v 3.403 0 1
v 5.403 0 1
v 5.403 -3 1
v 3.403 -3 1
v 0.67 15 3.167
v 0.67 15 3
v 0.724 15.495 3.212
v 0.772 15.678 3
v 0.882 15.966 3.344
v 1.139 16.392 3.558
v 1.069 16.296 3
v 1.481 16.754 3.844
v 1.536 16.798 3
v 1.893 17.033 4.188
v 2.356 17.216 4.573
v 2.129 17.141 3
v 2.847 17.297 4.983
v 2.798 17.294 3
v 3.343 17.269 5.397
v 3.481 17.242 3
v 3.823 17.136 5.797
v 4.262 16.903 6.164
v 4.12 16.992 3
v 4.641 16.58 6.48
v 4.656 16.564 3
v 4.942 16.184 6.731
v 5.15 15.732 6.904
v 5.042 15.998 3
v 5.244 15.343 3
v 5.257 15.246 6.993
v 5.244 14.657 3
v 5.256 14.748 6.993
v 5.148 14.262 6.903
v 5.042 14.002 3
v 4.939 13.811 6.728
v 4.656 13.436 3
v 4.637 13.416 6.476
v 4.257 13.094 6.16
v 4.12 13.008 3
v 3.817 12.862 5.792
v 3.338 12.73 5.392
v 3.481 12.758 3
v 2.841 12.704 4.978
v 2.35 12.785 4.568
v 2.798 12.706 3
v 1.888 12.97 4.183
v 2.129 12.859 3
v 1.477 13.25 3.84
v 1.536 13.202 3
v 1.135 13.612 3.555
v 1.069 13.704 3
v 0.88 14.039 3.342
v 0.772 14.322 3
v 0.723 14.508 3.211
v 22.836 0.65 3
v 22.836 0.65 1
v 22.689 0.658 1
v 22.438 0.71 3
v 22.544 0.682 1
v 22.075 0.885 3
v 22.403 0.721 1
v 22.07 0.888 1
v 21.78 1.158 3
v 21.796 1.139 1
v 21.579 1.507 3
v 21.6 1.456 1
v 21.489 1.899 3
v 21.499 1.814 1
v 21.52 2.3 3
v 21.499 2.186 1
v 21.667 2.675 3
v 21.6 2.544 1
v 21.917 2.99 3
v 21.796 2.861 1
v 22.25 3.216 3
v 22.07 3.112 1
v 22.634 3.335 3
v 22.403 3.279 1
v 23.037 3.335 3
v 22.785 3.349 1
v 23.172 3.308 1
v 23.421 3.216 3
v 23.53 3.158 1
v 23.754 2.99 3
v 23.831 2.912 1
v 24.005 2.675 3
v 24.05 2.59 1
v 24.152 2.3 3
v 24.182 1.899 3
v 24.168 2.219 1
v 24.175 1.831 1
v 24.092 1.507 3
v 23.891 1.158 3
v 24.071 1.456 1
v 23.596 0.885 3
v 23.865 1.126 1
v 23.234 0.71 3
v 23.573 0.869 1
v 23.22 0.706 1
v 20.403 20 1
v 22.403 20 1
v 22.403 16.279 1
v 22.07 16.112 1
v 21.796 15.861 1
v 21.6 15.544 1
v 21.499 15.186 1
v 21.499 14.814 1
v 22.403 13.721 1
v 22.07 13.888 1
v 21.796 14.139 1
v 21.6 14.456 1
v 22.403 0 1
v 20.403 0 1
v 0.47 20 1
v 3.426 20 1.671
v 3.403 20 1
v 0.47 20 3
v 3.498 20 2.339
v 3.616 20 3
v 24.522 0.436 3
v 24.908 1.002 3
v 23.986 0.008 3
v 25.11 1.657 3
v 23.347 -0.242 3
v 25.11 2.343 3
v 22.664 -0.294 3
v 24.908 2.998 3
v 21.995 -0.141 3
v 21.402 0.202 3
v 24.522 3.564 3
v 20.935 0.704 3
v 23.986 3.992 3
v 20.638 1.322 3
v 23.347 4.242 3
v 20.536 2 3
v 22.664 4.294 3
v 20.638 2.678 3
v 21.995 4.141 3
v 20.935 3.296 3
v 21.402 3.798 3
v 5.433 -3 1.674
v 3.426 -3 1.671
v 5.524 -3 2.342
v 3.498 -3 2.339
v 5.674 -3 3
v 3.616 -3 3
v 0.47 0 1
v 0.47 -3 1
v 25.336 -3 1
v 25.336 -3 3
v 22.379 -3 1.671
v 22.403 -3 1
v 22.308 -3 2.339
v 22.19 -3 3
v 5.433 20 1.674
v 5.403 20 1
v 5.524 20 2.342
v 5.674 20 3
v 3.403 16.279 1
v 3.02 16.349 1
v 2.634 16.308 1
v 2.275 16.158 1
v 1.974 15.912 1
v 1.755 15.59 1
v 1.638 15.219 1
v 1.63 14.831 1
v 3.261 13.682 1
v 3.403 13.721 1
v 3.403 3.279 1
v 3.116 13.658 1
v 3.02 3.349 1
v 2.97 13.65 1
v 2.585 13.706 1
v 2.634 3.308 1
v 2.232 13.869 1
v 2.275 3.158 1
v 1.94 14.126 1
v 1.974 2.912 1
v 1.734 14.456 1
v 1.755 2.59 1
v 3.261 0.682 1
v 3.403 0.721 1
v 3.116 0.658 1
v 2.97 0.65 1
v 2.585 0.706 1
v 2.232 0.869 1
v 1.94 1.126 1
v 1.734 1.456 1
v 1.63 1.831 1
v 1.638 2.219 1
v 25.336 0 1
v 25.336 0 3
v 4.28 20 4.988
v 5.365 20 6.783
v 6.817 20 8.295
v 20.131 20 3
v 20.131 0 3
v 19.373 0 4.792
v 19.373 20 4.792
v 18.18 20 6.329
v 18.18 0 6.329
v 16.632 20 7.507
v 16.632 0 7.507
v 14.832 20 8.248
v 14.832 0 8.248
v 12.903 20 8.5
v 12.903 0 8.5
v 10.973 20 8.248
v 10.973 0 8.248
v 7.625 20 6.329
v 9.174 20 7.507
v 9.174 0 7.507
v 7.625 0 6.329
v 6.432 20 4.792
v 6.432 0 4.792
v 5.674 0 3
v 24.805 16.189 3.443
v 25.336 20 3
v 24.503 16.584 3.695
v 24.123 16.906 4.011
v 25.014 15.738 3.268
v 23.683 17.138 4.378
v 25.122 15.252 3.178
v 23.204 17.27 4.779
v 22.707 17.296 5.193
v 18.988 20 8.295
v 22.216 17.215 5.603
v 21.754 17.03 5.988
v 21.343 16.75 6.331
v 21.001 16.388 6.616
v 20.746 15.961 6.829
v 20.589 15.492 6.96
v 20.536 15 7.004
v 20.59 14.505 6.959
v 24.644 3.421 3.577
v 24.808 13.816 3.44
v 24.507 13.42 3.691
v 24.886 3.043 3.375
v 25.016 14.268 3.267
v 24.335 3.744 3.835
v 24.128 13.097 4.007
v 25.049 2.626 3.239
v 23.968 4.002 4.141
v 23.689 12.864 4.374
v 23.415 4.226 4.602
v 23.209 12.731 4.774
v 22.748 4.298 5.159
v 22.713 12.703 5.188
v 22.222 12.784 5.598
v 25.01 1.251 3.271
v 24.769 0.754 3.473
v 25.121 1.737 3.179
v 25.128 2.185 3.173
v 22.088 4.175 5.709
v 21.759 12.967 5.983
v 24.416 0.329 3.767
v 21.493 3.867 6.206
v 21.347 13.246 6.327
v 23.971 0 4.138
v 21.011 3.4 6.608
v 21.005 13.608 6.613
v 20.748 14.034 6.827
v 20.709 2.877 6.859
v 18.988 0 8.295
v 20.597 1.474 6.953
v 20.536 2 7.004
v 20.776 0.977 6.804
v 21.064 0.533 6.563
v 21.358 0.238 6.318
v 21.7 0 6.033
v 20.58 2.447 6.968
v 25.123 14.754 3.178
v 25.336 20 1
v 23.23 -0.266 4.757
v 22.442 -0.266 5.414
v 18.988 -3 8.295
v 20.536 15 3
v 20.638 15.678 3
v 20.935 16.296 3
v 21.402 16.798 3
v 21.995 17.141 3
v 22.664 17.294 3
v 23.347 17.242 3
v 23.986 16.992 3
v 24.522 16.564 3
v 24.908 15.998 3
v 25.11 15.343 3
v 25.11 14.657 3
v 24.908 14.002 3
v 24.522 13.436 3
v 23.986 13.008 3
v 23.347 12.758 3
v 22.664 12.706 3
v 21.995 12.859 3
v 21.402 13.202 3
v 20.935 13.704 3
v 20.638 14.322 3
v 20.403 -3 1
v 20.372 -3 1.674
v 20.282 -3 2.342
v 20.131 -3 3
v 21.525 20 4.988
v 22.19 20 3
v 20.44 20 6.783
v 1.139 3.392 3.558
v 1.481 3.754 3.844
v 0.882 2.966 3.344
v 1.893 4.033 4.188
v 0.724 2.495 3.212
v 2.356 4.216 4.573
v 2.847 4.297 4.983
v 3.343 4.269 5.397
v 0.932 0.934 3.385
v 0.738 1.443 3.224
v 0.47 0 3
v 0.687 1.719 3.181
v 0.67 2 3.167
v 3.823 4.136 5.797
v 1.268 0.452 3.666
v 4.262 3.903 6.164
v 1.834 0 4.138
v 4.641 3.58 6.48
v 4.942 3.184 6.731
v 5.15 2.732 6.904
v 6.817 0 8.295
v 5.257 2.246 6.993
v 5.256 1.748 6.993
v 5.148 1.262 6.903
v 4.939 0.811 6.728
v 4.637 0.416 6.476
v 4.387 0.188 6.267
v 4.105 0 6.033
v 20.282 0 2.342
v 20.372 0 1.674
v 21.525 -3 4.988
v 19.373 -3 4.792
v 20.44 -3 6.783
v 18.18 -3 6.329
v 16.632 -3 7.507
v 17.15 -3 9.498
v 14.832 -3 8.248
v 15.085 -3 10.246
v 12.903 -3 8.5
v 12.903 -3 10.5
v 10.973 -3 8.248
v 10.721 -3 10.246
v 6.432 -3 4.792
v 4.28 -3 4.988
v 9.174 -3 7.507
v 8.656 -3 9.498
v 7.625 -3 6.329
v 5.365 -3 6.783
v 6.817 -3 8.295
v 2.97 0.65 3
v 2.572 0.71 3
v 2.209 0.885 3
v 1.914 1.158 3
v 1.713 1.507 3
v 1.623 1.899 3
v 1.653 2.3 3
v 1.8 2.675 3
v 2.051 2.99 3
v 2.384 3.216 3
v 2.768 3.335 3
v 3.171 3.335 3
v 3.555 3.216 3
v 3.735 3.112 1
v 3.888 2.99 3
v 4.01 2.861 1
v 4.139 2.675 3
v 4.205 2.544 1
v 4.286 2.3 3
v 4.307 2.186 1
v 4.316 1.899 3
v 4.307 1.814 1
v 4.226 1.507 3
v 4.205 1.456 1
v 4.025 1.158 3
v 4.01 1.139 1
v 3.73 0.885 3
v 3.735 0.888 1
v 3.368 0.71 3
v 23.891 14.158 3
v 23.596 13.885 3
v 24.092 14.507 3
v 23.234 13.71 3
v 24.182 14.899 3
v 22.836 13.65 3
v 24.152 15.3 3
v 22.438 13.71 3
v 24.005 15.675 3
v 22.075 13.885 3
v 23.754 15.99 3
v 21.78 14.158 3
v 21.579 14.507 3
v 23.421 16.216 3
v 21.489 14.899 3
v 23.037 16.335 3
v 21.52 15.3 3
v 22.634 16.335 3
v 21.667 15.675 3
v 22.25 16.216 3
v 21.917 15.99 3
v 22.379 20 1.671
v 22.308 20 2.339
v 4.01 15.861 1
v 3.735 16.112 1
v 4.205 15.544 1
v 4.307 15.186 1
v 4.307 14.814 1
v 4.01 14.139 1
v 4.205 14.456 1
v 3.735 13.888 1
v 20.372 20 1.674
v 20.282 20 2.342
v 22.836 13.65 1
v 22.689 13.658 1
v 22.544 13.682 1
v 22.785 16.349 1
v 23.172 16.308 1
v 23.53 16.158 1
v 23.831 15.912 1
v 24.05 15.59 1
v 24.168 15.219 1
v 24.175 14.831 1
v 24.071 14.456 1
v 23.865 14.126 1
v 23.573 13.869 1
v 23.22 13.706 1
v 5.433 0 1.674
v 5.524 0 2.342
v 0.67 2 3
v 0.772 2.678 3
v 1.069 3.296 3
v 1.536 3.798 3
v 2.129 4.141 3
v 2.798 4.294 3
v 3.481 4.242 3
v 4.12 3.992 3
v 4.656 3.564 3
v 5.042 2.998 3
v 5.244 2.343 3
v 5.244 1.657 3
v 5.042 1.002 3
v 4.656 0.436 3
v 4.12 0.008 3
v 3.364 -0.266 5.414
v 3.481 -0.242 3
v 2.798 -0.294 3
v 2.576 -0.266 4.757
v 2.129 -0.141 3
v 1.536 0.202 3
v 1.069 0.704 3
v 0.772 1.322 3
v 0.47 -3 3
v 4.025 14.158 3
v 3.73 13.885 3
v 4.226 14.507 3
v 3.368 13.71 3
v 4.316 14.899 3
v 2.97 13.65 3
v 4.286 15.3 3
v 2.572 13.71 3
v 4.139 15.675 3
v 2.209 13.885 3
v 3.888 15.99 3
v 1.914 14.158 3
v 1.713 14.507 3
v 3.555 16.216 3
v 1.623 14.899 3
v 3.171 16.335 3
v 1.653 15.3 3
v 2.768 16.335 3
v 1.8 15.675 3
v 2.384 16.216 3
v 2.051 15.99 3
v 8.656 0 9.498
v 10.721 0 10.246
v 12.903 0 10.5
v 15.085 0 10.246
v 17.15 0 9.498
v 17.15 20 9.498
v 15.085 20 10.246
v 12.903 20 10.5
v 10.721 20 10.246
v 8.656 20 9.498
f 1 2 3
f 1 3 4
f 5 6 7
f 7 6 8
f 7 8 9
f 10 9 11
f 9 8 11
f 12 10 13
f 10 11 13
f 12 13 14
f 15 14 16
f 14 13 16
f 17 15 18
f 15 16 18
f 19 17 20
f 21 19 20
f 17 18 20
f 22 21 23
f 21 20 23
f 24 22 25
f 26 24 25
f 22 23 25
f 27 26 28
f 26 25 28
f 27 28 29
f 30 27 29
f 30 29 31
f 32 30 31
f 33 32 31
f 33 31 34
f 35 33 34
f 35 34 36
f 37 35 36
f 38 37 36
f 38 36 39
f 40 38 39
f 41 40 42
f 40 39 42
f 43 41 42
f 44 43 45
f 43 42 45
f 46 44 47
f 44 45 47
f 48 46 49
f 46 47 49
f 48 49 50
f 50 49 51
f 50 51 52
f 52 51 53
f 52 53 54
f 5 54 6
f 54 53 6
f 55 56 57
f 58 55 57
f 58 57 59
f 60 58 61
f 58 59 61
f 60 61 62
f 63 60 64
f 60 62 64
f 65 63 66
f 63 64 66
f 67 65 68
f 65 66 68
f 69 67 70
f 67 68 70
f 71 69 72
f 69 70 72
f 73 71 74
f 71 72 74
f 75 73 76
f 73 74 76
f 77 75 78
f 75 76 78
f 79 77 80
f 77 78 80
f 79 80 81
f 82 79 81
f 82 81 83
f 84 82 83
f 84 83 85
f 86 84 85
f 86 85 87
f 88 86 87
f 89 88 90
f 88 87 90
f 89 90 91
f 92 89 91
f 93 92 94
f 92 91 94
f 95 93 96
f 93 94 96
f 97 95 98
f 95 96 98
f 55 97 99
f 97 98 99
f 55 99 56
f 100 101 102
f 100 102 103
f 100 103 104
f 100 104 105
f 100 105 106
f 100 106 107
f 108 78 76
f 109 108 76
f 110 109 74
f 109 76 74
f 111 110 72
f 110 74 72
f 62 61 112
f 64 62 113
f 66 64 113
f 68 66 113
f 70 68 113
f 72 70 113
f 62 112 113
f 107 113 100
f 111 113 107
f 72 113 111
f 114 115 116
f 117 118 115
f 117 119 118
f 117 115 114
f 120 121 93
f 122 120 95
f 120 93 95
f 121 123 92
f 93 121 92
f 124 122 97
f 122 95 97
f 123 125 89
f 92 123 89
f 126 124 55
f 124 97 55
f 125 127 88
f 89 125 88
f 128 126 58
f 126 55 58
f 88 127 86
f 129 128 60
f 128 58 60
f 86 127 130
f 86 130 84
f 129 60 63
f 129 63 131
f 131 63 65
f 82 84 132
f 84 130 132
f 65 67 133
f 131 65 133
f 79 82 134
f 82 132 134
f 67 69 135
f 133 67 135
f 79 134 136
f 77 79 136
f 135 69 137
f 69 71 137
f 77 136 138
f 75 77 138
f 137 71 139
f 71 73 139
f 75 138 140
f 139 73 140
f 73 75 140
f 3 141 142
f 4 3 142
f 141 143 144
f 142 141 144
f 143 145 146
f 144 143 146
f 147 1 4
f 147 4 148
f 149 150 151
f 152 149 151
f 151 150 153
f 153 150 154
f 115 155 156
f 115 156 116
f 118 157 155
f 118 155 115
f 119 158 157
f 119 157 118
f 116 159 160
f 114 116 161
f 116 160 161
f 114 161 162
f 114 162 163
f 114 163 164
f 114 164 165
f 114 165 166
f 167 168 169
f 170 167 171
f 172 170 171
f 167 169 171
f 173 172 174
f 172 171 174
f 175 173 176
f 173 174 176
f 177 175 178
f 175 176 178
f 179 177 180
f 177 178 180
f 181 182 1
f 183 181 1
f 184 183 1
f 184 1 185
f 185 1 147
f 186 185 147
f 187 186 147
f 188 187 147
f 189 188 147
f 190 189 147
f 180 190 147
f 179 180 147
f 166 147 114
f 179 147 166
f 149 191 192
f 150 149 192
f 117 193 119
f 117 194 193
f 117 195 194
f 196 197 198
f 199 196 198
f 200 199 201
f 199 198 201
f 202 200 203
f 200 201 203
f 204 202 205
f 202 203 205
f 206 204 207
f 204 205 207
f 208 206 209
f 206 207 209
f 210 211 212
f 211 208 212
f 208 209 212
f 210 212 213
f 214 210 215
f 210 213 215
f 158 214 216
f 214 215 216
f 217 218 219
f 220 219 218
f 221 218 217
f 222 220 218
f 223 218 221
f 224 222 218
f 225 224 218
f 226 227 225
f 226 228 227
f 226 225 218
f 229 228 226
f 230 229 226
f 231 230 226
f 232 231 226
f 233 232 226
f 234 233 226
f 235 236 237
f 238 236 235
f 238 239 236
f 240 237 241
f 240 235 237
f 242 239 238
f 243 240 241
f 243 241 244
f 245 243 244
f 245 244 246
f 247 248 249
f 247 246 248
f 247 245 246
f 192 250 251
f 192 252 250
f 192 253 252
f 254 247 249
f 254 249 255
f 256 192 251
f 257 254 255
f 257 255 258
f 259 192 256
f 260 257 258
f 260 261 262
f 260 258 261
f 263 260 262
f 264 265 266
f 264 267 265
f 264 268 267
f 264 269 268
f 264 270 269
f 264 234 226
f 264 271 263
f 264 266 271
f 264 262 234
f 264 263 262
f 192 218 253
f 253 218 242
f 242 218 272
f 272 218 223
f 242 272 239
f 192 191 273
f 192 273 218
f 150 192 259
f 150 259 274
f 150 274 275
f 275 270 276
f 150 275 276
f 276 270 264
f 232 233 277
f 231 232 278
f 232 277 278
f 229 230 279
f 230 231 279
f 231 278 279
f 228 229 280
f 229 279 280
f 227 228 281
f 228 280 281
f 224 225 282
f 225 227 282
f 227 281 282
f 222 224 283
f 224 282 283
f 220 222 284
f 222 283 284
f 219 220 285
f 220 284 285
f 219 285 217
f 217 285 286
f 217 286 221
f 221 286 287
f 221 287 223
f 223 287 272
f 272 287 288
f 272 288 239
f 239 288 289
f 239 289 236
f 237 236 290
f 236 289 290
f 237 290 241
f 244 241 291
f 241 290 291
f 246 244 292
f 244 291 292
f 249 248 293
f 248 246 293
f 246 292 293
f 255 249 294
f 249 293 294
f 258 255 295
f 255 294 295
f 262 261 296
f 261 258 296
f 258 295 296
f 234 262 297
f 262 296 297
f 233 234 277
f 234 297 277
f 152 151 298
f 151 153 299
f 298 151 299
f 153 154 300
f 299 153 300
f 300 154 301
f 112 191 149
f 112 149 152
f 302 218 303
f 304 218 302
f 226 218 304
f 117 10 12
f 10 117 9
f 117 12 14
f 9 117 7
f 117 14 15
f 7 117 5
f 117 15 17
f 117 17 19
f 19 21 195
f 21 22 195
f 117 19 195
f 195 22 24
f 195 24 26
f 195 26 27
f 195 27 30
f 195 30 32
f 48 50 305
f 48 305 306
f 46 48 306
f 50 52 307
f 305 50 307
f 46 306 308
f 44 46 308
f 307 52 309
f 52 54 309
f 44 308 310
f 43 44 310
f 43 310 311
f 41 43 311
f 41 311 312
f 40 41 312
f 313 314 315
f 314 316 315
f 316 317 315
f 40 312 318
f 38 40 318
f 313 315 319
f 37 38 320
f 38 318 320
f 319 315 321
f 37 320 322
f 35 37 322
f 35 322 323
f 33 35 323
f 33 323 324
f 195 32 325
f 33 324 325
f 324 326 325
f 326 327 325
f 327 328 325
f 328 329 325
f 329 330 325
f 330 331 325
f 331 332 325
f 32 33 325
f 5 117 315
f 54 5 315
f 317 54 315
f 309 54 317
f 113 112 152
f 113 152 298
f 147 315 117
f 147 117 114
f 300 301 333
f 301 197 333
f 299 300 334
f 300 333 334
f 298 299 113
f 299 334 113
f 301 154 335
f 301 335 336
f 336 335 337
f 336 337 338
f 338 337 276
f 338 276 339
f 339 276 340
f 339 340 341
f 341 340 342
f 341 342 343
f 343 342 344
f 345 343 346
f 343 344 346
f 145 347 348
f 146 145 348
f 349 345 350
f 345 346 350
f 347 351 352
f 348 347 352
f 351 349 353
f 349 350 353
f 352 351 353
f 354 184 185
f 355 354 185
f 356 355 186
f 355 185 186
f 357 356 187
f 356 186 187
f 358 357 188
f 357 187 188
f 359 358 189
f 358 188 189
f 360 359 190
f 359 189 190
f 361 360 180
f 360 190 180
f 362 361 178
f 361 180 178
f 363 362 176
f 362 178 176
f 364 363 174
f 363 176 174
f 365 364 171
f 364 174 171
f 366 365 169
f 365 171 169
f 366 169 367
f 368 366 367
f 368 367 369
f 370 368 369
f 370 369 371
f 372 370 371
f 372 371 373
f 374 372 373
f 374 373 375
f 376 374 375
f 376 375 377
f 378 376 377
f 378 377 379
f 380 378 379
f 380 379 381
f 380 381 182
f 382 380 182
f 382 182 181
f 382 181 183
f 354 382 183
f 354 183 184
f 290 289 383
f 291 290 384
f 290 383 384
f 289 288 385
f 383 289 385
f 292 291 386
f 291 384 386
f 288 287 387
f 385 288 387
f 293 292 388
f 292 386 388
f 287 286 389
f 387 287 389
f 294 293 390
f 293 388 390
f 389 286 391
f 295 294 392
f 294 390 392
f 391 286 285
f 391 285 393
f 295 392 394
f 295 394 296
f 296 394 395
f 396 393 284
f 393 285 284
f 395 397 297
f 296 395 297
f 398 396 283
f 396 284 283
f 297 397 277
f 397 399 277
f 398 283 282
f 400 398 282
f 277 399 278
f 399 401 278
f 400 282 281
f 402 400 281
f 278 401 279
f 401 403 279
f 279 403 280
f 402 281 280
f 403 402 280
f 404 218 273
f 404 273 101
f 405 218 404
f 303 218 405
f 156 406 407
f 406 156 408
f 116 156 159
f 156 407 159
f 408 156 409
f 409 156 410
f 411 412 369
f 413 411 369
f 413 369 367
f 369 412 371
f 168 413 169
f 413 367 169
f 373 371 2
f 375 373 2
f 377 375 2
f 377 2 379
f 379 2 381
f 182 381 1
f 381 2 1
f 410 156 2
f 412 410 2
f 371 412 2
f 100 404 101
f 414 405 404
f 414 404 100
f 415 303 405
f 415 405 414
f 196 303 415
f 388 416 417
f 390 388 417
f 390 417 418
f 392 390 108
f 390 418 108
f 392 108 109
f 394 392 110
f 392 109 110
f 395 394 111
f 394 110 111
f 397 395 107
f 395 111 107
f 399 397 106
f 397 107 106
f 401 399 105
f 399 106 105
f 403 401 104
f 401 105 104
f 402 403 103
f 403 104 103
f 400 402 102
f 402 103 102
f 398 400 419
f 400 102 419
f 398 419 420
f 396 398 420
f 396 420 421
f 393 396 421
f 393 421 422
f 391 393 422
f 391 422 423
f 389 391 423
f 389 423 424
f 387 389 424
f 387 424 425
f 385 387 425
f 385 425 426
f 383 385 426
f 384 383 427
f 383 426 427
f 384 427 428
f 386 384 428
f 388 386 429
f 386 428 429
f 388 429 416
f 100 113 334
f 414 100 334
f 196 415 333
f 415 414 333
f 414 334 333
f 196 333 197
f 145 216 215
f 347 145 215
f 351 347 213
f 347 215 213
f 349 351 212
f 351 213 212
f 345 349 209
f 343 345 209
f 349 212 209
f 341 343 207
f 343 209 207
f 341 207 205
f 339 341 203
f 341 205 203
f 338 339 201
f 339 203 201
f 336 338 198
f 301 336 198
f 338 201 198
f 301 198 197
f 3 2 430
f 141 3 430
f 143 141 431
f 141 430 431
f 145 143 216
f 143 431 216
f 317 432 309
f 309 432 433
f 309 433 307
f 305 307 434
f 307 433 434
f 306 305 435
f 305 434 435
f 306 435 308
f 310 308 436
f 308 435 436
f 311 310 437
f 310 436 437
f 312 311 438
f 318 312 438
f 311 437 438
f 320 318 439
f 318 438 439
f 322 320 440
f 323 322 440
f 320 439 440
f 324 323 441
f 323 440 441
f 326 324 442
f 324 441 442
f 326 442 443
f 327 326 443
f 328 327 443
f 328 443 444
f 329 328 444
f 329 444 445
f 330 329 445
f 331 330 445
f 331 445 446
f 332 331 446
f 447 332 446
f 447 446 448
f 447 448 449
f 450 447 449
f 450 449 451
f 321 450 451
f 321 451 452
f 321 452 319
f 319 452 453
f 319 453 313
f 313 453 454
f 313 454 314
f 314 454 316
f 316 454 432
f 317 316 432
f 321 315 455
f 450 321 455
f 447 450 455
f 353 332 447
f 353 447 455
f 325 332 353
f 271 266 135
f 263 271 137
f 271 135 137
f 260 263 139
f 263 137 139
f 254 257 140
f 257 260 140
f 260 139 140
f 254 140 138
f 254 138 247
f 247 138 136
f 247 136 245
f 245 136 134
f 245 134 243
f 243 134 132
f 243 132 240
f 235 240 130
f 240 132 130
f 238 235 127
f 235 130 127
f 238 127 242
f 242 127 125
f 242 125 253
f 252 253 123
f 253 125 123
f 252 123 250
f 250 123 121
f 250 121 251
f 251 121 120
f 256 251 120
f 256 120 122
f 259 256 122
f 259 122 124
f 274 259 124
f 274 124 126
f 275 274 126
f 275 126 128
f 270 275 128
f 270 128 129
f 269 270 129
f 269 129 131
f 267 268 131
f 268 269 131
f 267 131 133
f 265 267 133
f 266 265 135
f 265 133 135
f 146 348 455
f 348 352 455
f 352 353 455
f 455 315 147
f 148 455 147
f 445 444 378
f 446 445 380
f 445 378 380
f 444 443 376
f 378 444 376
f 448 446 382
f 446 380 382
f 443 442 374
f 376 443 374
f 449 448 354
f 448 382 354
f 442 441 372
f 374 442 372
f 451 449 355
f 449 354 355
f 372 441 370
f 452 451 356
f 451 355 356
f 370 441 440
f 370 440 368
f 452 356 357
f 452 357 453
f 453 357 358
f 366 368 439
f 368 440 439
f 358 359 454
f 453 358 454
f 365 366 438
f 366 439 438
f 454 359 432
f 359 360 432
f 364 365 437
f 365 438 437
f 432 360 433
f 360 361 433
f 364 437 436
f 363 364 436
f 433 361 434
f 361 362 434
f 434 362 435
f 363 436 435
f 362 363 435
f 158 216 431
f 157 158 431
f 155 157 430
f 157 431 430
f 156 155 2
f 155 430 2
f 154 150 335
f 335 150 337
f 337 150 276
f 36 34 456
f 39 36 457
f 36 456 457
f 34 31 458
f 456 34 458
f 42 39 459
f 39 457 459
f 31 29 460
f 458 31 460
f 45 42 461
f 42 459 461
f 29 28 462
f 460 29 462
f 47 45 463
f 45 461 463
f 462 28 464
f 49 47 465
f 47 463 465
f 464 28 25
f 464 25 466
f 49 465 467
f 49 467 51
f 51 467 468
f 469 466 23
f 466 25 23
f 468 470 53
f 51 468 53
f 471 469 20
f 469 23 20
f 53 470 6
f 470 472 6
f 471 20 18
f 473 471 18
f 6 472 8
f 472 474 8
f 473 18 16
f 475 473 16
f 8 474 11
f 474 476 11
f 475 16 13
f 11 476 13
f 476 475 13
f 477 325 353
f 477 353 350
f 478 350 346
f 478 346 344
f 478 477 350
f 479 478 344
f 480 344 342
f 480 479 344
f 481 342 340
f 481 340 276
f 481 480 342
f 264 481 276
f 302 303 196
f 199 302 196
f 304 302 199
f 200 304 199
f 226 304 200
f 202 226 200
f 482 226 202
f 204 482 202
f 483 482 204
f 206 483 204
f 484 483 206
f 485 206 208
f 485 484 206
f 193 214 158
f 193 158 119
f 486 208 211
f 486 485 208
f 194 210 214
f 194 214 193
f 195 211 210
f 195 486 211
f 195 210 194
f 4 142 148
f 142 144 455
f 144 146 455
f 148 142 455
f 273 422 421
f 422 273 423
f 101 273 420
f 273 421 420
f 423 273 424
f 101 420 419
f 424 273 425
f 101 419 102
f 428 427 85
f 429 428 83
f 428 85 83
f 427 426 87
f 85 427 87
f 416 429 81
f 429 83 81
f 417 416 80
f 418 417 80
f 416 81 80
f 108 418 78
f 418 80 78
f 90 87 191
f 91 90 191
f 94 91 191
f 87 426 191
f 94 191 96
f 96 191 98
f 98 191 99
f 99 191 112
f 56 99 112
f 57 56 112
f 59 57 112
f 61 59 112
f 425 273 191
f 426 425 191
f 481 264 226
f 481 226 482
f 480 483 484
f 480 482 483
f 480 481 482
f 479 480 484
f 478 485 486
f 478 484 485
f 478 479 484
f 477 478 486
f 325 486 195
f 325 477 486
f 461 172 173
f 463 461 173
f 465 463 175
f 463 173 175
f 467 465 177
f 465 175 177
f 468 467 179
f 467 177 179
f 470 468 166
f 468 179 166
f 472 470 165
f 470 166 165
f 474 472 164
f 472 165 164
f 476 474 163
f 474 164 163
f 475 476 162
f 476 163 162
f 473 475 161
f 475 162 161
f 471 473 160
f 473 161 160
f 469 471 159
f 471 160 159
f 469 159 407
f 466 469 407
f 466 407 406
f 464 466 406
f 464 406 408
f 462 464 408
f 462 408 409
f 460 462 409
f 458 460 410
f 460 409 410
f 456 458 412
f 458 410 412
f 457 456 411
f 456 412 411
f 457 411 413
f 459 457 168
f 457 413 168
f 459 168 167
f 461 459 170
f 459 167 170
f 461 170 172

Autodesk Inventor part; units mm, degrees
ref_plane "YZ Plane" through (0, 0, 0) normal (1, 0, 0) x (0, 1, 0)
ref_plane "XZ Plane" through (0, 0, 0) normal (0, 1, 0) x (-1, 0, 0)
sketch "Sketch1" plane through (0, 0, 0) normal (0, 1, 0) x (-1, 0, 0)
  arc A0 (-20.3357, 0) -> (-5.4696, 0) centre (-12.9027, 1) ccw projected
  circle A1 centre (-12.9027, 1) radius 7.5
  circle A2 centre (-12.9027, 1) radius 9.5
  line L0 (-0.4696, 0) -> (-5.4696, 0) projected
  line L1 (-20.3357, 0) -> (-25.3357, 0) projected
  line L2 (-0.4696, 0) -> (-25.3357, 0)
  line L3 (-25.3357, 0) -> (-25.3357, 1)
  line L4 (-25.3357, 1) -> (-0.4696, 1)
  line L5 (-0.4696, 1) -> (-0.4696, 0)
  line L6 (-0.4696, 1) -> (-25.3357, 1)
  line L7 (-25.3357, 1) -> (-25.3357, 3)
  line L8 (-25.3357, 3) -> (-0.4696, 3)
  line L9 (-0.4696, 3) -> (-0.4696, 1)
  line L10 (-25.3357, 3) -> (-16.9494, 9.9957)
  line L11 (-0.4696, 3) -> (-9.4027, 10.4518)
  point P0 (0, 0)
  point P1 (-6.8173, 8.2951)
  point P2 (-18.9881, 8.2951)
  point P3 (-20.4027, 1)
  point P4 (-5.4027, 1)
  dimension "d0" = 2
  dimension "d1" = 1
  dimension "d2" = 2
ref_plane "Work Plane1" through (-1.0566, 20, -15.5001) normal (0, 1, 0) x (-0.6956, 0, 0.7184)
extrude "Extrusion1" add sketch "Sketch1" along normal blind 20 and the other way blind 3 contours L4 A2 L8 A1 | A1 L8 A2 L4 | L8 A2 A1 | L4 L7 L8 A2 | A2 L8 L9 L4 | L8 L10 A2 | A2 L11 L8
ref_plane "Work Plane2" through (5.4027, -3, 3) normal (0, 0, -1) x (-1, 0, 0)
sketch "Sketch2" plane through (5.4027, -3, 3) normal (0, 0, -1) x (-1, 0, 0)
  circle A0 centre (2.433, 5) radius 1.15 projected
  circle A1 centre (2.433, 18) radius 1.15 projected
  line L0 (-0.067, 23) -> (-0.067, 0) projected
  line L1 (4.933, 23) -> (-0.067, 23) projected
  line L2 (4.933, 23) -> (4.933, 0) projected
  line L3 (-0.067, 0) -> (4.933, 0) projected
  circle A2 centre (-17.433, 18) radius 1.15 projected
  circle A3 centre (-17.433, 5) radius 1.15 projected
  line L4 (-14.933, 0) -> (-14.933, 23) projected
  line L5 (-19.933, 0) -> (-14.933, 0) projected
  line L6 (-19.933, 23) -> (-19.933, 0) projected
  line L7 (-14.933, 23) -> (-19.933, 23) projected
  circle A4 centre (2.433, 18) radius 2.3
  circle A5 centre (2.433, 5) radius 2.3
  circle A6 centre (-17.433, 18) radius 2.3
  circle A7 centre (-17.433, 5) radius 2.3
  point P0 (5.4027, 3)
  dimension "d6" = 4.6
  dimension "d7" = 4.6
  dimension "d8" = 4.6
  dimension "d9" = 4.6
extrude "Extrusion2" cut sketch "Sketch2" against normal blind 10 contours A0 | A1 | A2 | A3 | A4 | A5 | A6 | A7
hole "Hole1" at (2.9696, 15, 3) at (2.9696, 2, 3) at (22.8357, 2, 3) at (22.8357, 15, 3) direction (0, 0, -1) diameter 2.7 end through all clearance for "Countersunk Flat Head Screw ISO 2009/7046" size "M2.5" standard "ISO"
properties part number "cpap hose holder"
